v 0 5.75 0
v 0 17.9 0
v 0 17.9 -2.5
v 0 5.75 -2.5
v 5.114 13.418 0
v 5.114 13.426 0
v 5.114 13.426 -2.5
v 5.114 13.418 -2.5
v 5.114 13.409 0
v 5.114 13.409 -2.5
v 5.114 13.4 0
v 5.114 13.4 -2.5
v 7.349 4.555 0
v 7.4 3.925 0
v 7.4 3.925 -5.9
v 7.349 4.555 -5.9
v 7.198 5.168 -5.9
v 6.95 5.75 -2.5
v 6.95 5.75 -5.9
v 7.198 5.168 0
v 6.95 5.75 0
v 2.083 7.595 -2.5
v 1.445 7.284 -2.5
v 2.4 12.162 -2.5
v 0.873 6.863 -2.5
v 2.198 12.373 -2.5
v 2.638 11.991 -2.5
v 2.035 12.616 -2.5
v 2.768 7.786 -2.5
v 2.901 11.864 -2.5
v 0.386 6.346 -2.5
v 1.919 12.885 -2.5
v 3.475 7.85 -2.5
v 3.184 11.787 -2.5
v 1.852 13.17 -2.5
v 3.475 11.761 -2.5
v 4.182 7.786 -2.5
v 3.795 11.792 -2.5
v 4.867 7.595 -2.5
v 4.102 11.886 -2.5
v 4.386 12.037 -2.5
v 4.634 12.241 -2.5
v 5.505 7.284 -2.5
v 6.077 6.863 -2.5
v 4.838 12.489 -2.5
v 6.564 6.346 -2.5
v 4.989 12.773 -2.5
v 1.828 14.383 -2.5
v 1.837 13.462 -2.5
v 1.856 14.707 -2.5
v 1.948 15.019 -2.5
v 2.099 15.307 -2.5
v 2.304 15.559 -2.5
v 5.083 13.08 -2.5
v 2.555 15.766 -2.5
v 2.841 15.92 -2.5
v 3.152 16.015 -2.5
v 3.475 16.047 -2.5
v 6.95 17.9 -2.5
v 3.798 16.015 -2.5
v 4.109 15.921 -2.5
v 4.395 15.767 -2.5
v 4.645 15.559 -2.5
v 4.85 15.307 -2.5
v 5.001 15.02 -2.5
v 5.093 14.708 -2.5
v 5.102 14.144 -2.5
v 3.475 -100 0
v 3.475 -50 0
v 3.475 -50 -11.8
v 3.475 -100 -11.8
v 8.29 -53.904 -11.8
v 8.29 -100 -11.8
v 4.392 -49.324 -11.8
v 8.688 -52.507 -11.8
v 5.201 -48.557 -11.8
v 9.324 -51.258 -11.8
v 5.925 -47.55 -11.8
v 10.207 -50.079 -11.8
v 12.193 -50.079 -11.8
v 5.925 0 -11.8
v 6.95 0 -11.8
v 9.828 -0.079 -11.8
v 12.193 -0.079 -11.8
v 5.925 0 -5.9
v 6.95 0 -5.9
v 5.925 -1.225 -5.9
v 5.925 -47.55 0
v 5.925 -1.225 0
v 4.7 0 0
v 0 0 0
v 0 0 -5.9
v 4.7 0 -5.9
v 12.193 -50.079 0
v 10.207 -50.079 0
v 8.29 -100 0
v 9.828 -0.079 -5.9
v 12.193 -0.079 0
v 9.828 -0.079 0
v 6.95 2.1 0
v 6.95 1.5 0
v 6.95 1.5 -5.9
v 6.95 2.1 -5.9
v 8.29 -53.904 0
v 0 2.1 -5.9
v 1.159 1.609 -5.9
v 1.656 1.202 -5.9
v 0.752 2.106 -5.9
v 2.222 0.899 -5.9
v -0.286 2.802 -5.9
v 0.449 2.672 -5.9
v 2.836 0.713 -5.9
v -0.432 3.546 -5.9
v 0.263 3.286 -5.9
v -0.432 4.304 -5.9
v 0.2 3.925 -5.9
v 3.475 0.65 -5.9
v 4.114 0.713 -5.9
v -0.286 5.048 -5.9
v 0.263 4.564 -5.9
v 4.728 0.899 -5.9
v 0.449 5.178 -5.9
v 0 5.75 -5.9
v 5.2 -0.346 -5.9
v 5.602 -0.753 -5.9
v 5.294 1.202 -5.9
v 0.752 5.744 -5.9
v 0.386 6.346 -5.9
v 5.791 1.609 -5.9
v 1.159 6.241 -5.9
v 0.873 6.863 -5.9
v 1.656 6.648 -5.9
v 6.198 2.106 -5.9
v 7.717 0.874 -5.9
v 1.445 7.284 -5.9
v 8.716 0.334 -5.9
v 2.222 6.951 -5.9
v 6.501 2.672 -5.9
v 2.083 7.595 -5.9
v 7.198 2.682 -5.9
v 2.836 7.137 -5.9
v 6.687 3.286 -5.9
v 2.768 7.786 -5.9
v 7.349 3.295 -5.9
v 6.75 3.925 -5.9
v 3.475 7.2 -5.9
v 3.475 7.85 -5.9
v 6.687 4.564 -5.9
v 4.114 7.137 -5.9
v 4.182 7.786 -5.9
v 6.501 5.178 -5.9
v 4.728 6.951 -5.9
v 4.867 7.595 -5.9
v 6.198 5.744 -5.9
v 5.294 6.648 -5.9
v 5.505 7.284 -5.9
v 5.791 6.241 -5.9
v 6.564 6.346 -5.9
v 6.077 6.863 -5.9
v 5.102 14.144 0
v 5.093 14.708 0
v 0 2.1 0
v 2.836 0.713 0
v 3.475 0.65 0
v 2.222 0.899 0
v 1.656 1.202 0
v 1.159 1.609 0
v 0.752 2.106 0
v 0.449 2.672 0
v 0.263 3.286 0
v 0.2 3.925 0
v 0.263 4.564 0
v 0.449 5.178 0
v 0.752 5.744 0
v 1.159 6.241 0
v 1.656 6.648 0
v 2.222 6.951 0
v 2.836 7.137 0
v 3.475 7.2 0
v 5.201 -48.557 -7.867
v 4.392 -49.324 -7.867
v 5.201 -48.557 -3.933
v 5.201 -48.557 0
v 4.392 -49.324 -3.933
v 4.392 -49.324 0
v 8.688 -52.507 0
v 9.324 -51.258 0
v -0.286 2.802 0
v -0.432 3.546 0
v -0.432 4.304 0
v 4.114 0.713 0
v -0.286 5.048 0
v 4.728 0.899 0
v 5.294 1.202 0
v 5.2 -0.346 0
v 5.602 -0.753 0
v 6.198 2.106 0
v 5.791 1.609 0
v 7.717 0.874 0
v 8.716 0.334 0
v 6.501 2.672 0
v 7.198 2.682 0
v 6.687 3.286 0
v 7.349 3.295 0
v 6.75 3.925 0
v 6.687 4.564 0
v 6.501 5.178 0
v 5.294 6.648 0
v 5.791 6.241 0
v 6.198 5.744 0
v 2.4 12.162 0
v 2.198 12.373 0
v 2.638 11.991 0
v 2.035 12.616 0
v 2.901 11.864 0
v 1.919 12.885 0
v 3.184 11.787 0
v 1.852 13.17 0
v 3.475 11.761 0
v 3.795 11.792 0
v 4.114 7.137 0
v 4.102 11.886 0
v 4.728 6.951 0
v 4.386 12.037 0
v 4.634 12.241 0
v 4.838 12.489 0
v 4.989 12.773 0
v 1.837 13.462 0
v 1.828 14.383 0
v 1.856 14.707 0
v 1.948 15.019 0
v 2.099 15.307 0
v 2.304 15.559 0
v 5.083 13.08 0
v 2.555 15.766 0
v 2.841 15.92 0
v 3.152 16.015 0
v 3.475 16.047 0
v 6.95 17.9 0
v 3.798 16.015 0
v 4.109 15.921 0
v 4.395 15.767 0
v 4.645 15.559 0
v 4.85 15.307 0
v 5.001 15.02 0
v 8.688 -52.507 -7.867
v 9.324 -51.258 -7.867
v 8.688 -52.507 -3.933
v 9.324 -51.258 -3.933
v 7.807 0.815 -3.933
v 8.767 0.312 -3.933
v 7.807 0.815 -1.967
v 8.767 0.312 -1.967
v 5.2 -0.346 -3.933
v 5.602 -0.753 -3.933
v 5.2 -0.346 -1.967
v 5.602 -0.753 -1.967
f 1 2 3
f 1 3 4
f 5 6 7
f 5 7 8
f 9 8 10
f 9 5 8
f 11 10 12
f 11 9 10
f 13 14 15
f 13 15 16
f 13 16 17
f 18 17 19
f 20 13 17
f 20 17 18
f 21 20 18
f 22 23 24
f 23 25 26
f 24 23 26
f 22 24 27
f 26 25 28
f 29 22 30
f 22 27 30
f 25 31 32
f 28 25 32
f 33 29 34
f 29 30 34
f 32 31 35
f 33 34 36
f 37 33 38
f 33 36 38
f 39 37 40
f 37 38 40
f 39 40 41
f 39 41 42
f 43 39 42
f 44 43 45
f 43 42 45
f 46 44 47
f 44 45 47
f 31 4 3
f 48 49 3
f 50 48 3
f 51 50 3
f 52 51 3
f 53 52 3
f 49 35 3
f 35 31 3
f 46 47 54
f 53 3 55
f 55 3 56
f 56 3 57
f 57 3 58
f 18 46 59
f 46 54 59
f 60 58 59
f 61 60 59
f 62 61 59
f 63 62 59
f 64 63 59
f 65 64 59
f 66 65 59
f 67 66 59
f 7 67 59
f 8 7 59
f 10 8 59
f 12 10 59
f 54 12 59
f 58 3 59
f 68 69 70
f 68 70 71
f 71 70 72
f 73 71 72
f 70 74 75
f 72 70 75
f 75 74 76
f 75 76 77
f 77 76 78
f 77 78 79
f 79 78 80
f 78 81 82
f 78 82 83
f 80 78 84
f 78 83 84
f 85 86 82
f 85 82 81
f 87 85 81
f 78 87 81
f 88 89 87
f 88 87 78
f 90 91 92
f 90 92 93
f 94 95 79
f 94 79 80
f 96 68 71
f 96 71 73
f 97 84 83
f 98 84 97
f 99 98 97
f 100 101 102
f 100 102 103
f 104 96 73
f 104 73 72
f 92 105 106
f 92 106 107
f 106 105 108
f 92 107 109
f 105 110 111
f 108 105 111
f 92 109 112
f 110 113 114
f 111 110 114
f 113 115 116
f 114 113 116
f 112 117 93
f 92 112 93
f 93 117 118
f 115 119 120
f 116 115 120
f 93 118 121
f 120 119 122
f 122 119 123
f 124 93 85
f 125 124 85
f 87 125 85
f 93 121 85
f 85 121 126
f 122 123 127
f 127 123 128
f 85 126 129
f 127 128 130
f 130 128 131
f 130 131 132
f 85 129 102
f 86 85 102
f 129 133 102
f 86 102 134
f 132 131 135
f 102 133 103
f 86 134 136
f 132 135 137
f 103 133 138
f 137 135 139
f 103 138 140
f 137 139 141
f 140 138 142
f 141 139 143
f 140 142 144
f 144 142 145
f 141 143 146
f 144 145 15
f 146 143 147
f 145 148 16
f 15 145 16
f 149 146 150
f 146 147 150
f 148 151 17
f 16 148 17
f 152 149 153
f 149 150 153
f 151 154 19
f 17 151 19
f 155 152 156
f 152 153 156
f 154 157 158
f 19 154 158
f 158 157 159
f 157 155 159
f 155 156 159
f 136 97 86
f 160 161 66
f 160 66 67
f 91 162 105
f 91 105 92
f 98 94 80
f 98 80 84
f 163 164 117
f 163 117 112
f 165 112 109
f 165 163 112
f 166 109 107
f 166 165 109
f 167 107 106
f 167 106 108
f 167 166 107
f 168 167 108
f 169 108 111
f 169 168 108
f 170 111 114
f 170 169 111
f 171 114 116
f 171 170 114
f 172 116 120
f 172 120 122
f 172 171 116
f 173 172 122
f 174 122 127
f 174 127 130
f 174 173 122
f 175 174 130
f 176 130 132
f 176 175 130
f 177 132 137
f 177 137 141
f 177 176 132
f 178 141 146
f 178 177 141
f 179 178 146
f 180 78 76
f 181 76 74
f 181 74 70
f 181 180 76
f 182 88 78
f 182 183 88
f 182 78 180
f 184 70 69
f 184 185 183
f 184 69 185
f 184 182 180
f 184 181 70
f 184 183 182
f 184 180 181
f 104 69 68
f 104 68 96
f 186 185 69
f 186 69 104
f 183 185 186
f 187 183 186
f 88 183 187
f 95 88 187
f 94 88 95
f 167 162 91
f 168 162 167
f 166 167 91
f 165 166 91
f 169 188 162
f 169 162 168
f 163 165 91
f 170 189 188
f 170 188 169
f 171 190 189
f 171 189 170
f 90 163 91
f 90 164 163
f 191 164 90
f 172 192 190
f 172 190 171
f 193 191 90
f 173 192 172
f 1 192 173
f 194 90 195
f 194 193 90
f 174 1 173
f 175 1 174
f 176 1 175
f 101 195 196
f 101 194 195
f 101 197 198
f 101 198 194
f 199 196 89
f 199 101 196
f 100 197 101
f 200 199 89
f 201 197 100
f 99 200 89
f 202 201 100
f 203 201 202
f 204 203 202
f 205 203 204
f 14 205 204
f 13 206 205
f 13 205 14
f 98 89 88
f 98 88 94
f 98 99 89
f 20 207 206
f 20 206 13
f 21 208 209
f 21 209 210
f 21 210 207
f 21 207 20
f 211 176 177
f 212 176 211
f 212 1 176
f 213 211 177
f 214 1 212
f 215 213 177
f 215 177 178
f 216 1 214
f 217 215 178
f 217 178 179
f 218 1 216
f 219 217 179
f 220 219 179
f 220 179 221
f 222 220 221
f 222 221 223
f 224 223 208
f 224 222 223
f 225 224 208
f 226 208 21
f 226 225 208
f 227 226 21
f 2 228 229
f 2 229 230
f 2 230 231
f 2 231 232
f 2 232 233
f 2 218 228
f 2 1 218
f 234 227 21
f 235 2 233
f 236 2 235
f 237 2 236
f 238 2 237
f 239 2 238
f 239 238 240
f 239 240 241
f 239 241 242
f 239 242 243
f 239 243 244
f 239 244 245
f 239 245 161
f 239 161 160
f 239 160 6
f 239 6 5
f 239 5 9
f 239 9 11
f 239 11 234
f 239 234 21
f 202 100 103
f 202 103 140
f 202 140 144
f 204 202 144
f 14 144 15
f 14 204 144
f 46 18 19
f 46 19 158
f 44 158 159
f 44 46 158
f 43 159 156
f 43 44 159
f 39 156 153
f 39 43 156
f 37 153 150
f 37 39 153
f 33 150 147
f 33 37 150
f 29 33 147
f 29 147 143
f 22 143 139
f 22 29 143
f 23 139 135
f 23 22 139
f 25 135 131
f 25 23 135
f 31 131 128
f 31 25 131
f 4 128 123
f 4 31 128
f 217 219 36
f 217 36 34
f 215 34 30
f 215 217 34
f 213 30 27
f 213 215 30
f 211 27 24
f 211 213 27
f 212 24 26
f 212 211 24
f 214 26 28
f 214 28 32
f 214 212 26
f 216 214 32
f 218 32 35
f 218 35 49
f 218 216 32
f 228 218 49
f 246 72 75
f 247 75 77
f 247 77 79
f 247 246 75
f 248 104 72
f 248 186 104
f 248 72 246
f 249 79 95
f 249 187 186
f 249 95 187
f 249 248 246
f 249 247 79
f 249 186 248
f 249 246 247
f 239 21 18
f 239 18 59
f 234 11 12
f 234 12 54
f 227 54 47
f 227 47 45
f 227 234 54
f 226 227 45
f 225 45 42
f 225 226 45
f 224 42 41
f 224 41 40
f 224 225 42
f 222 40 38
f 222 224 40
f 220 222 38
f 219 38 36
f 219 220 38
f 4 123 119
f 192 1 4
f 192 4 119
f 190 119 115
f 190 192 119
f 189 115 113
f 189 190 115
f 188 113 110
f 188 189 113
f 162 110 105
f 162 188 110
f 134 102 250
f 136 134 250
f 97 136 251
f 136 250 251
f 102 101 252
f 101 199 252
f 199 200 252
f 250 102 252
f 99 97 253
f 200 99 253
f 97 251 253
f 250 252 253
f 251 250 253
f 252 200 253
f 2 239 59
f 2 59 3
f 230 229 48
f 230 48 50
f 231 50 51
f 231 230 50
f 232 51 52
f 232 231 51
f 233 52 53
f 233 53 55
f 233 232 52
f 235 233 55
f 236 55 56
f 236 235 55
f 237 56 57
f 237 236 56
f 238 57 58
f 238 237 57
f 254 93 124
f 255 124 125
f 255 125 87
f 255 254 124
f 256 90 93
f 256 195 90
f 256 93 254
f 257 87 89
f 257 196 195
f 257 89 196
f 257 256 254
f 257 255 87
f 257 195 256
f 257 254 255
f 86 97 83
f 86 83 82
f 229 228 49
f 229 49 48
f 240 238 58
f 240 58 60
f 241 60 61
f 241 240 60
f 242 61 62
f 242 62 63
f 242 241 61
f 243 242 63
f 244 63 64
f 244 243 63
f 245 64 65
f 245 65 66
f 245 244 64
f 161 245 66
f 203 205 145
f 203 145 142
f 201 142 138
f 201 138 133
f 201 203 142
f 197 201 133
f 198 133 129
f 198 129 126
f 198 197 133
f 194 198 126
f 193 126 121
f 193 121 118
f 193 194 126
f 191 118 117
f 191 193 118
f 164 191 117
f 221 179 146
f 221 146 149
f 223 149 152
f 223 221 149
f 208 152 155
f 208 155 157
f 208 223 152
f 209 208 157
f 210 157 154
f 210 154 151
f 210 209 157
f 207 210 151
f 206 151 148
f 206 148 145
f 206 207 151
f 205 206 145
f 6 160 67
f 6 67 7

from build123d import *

# Parameters (mm, degrees)
F1_DEPTH = 5.9
F2_DEPTH = 11.8
F3_DEPTH = 2.5


with BuildPart() as f1:
    # F0 (on Top) → F1 (new body)
    with BuildSketch(Plane.XY):
        with BuildLine():
            Line((3.475, 0.65), (3.475, 0))
            ThreePointArc((3.475, 0), (4.7730375063, 0.2208504846), (5.925, 0.8585484677))
            ThreePointArc((5.925, 0.8585484677), (6.5018486959, 1.426237912), (6.95, 2.1001712409))
            Line((6.95, 2.1001712409), (6.95, 5.7498287591))
            ThreePointArc((6.95, 5.7498287591), (5.5051689733, 7.2841723593), (3.475, 7.85))
            Line((3.475, 7.85), (3.475, 7.2))
            ThreePointArc((3.475, 7.2), (5.7907747084, 6.2407747084), (6.75, 3.925))
            ThreePointArc((6.75, 3.925), (5.7907747084, 1.6092252916), (3.475, 0.65))
        make_face()
        with BuildLine():
            Line((0, 5.7498287591), (0, 2.1001712409))
            ThreePointArc((0, 2.1001712409), (0.4481513041, 1.426237912), (1.025, 0.8585484677))
            ThreePointArc((1.025, 0.8585484677), (2.1769624937, 0.2208504846), (3.475, 0))
            Line((3.475, 0), (3.475, 0.65))
            ThreePointArc((3.475, 0.65), (0.2, 3.925), (3.475, 7.2))
            Line((3.475, 7.2), (3.475, 7.85))
            ThreePointArc((3.475, 7.85), (1.4448310267, 7.2841723593), (0, 5.7498287591))
        make_face()
        with BuildLine():
            Line((0, 2.1001712409), (0, 0))
            Line((0, 0), (1.025, 0))
            Line((1.025, 0), (1.025, 0.8585484677))
            ThreePointArc((1.025, 0.8585484677), (0.4481513041, 1.426237912), (0, 2.1001712409))
        make_face()
        with BuildLine():
            Line((1.025, 0.8585484677), (1.025, 0))
            Line((1.025, 0), (3.475, 0))
            ThreePointArc((3.475, 0), (2.1769624937, 0.2208504846), (1.025, 0.8585484677))
        make_face()
        with BuildLine():
            ThreePointArc((0, 5.7498287591), (-0.45, 3.925), (0, 2.1001712409))
            Line((0, 2.1001712409), (0, 5.7498287591))
        make_face()
        with BuildLine():
            Line((6.95, 5.7498287591), (6.95, 2.1001712409))
            ThreePointArc((6.95, 2.1001712409), (7.2858398025, 2.9852526935), (7.4, 3.925))
            ThreePointArc((7.4, 3.925), (7.2858398025, 4.8647473065), (6.95, 5.7498287591))
        make_face()
        with BuildLine():
            ThreePointArc((6.95, 2.1001712409), (6.5018486959, 1.426237912), (5.925, 0.8585484677))
            Line((5.925, 0.8585484677), (5.925, 0))
            Line((5.925, 0), (6.95, 0))
            Line((6.95, 0), (6.95, 1.44))
            Line((6.95, 1.44), (6.95, 1.5))
            Line((6.95, 1.5), (6.95, 2.1001712409))
        make_face()
        with BuildLine():
            ThreePointArc((5.925, 0.8585484677), (4.7730375063, 0.2208504846), (3.475, 0))
            Line((3.475, 0), (4.7, 0))
            Line((4.7, 0), (5.925, 0))
            Line((5.925, 0), (5.925, 0.8585484677))
        make_face()
        with BuildLine():
            Line((5.925, 0), (4.7, 0))
            add(Edge.make_bspline(
                [(4.7, 0), (5.2537494339, -0.3164176305), (5.6369397789, -0.7196032093), (5.925, -1.225)],
                knots=[0, 0, 0, 0, 1.7324116139, 1.7324116139, 1.7324116139, 1.7324116139], degree=3))
            Line((5.925, -1.225), (5.925, -0.079424061))
            Line((5.925, -0.079424061), (5.925, 0))
        make_face()
        with BuildLine():
            Line((6.95, 1.44), (6.95, 0))
            Line((6.95, 0), (9.8284865708, -0.079424061))
            add(Edge.make_bspline(
                [(6.95, 1.5), (7.7566024847, 0.7003984647), (8.7155010551, 0.2800084476), (9.8284865708, -0.079424061)],
                knots=[0, 0, 0, 0, 3.2833314336, 3.2833314336, 3.2833314336, 3.2833314336], degree=3))
            Line((6.95, 1.5), (6.95, 1.44))
        make_face()
    extrude(amount=-F1_DEPTH)

    # F0 (on Top) → F2 (join)
    with BuildSketch(Plane.XY):
        Polygon((8.29, -50.0240602729), (5.925, -50), (5.925, -52.0125), (5.925, -100), (8.29, -100), (8.29, -53.904), align=None)
        with BuildLine():
            add(Edge.make_bspline(
                [(5.925, -47.55), (5.2342489362, -48.7282052636), (4.4546769932, -49.3181198835), (3.475, -50)],
                knots=[0, 0, 0, 0, 3.4648232278, 3.4648232278, 3.4648232278, 3.4648232278], degree=3))
            Line((3.475, -50), (5.925, -50))
            Line((5.925, -50), (5.925, -47.55))
        make_face()
        Polygon((5.925, -50), (3.475, -50), (3.475, -100), (5.925, -100), (5.925, -52.0125), align=None)
        with BuildLine():
            Line((9.8284865708, -50.079424061), (9.8284865708, -50.0397120305))
            Line((9.8284865708, -50.0397120305), (8.29, -50.0240602729))
            Line((8.29, -50.0240602729), (8.29, -53.904))
            add(Edge.make_bspline(
                [(8.29, -53.904), (8.5714472143, -52.4050904341), (9.1968655396, -51.250747129), (10.207343012, -50.079424061)],
                knots=[0, 0, 0, 0, 4.2808358806, 4.2808358806, 4.2808358806, 4.2808358806], degree=3))
            Line((10.207343012, -50.079424061), (9.8284865708, -50.079424061))
        make_face()
        Polygon((9.8284865708, -25), (5.925, -25), (5.925, -26.9515), (5.925, -28.903), (5.925, -47.55), (5.925, -50), (8.29, -50), (9.8284865708, -50.0313035152), align=None)
        Polygon((12.1934865708, -0.079424061), (9.8284865708, -0.079424061), (9.8284865708, -25), (9.8284865708, -50.0313035152), (10.2417432854, -50.0397120305), (12.1934865708, -50.079424061), align=None)
        with BuildLine():
            Line((10.2417432854, -50.0397120305), (9.8284865708, -50.0313035152))
            Line((9.8284865708, -50.0313035152), (9.8284865708, -50.0397120305))
            Line((9.8284865708, -50.0397120305), (9.8284865708, -50.079424061))
            Line((9.8284865708, -50.079424061), (10.207343012, -50.079424061))
            add(Edge.make_bspline(
                [(10.207343012, -50.079424061), (10.2187605889, -50.0661890592), (10.230227327, -50.0529518896), (10.2417432854, -50.0397120305)],
                knots=[4.2808358806, 4.2808358806, 4.2808358806, 4.2808358806, 4.3292058583, 4.3292058583, 4.3292058583, 4.3292058583], degree=3))
        make_face()
        with BuildLine():
            Line((10.207343012, -50.079424061), (12.1934865708, -50.079424061))
            Line((12.1934865708, -50.079424061), (10.2417432854, -50.0397120305))
            add(Edge.make_bspline(
                [(10.207343012, -50.079424061), (10.2187605889, -50.0661890592), (10.230227327, -50.0529518896), (10.2417432854, -50.0397120305)],
                knots=[4.2808358806, 4.2808358806, 4.2808358806, 4.2808358806, 4.3292058583, 4.3292058583, 4.3292058583, 4.3292058583], degree=3))
        make_face()
        Polygon((9.8284865708, -50.0397120305), (9.8284865708, -50.0313035152), (8.29, -50), (8.29, -50.0240602729), align=None)
        Polygon((8.29, -50.0240602729), (8.29, -50), (5.925, -50), align=None)
        Polygon((6.95, 0), (5.925, 0), (5.925, -0.079424061), (5.925, -1.225), (5.925, -21.3844068348), (5.925, -22.55), (5.925, -22.9875), (5.925, -25), (9.8284865708, -25), (9.8284865708, -0.079424061), align=None)
    extrude(amount=-F2_DEPTH)

    # F0 (on Top) → F3 (join)
    with BuildSketch(Plane.XY):
        with BuildLine():
            Line((0, 7.85), (0, 5.7498287591))
            ThreePointArc((0, 5.7498287591), (1.4448310267, 7.2841723593), (3.475, 7.85))
            ThreePointArc((3.475, 7.85), (5.5051689733, 7.2841723593), (6.95, 5.7498287591))
            Line((6.95, 5.7498287591), (6.95, 17.9))
            Line((6.95, 17.9), (3.475, 17.9))
            Line((3.475, 17.9), (0, 17.9))
            Line((0, 17.9), (0, 7.85))
        make_face()
        with BuildLine():
            ThreePointArc((1.8276640256, 14.3833613398), (2.3042302705, 15.55900427), (3.475, 16.0474200003))
            ThreePointArc((3.475, 16.0474200003), (4.5253988967, 15.6691157612), (5.0933824344, 14.7079463483))
            Line((5.0933824344, 14.7079463483), (5.1024433757, 14.1442252627))
            Line((5.1024433757, 14.1442252627), (5.113982201, 13.4263440945))
            ThreePointArc((5.113982201, 13.4263440945), (5.1141409801, 13.4131724726), (5.1141939076, 13.4))
            ThreePointArc((5.1141939076, 13.4), (4.6340851277, 12.2409148723), (3.475, 11.7608060924))
            ThreePointArc((3.475, 11.7608060924), (2.2942628451, 12.2629791393), (1.8369719791, 13.4618131819))
            Line((1.8369719791, 13.4618131819), (1.8276640256, 14.3833613398))
        make_face(mode=Mode.SUBTRACT)
    extrude(amount=-F3_DEPTH)


solid = f1.part
